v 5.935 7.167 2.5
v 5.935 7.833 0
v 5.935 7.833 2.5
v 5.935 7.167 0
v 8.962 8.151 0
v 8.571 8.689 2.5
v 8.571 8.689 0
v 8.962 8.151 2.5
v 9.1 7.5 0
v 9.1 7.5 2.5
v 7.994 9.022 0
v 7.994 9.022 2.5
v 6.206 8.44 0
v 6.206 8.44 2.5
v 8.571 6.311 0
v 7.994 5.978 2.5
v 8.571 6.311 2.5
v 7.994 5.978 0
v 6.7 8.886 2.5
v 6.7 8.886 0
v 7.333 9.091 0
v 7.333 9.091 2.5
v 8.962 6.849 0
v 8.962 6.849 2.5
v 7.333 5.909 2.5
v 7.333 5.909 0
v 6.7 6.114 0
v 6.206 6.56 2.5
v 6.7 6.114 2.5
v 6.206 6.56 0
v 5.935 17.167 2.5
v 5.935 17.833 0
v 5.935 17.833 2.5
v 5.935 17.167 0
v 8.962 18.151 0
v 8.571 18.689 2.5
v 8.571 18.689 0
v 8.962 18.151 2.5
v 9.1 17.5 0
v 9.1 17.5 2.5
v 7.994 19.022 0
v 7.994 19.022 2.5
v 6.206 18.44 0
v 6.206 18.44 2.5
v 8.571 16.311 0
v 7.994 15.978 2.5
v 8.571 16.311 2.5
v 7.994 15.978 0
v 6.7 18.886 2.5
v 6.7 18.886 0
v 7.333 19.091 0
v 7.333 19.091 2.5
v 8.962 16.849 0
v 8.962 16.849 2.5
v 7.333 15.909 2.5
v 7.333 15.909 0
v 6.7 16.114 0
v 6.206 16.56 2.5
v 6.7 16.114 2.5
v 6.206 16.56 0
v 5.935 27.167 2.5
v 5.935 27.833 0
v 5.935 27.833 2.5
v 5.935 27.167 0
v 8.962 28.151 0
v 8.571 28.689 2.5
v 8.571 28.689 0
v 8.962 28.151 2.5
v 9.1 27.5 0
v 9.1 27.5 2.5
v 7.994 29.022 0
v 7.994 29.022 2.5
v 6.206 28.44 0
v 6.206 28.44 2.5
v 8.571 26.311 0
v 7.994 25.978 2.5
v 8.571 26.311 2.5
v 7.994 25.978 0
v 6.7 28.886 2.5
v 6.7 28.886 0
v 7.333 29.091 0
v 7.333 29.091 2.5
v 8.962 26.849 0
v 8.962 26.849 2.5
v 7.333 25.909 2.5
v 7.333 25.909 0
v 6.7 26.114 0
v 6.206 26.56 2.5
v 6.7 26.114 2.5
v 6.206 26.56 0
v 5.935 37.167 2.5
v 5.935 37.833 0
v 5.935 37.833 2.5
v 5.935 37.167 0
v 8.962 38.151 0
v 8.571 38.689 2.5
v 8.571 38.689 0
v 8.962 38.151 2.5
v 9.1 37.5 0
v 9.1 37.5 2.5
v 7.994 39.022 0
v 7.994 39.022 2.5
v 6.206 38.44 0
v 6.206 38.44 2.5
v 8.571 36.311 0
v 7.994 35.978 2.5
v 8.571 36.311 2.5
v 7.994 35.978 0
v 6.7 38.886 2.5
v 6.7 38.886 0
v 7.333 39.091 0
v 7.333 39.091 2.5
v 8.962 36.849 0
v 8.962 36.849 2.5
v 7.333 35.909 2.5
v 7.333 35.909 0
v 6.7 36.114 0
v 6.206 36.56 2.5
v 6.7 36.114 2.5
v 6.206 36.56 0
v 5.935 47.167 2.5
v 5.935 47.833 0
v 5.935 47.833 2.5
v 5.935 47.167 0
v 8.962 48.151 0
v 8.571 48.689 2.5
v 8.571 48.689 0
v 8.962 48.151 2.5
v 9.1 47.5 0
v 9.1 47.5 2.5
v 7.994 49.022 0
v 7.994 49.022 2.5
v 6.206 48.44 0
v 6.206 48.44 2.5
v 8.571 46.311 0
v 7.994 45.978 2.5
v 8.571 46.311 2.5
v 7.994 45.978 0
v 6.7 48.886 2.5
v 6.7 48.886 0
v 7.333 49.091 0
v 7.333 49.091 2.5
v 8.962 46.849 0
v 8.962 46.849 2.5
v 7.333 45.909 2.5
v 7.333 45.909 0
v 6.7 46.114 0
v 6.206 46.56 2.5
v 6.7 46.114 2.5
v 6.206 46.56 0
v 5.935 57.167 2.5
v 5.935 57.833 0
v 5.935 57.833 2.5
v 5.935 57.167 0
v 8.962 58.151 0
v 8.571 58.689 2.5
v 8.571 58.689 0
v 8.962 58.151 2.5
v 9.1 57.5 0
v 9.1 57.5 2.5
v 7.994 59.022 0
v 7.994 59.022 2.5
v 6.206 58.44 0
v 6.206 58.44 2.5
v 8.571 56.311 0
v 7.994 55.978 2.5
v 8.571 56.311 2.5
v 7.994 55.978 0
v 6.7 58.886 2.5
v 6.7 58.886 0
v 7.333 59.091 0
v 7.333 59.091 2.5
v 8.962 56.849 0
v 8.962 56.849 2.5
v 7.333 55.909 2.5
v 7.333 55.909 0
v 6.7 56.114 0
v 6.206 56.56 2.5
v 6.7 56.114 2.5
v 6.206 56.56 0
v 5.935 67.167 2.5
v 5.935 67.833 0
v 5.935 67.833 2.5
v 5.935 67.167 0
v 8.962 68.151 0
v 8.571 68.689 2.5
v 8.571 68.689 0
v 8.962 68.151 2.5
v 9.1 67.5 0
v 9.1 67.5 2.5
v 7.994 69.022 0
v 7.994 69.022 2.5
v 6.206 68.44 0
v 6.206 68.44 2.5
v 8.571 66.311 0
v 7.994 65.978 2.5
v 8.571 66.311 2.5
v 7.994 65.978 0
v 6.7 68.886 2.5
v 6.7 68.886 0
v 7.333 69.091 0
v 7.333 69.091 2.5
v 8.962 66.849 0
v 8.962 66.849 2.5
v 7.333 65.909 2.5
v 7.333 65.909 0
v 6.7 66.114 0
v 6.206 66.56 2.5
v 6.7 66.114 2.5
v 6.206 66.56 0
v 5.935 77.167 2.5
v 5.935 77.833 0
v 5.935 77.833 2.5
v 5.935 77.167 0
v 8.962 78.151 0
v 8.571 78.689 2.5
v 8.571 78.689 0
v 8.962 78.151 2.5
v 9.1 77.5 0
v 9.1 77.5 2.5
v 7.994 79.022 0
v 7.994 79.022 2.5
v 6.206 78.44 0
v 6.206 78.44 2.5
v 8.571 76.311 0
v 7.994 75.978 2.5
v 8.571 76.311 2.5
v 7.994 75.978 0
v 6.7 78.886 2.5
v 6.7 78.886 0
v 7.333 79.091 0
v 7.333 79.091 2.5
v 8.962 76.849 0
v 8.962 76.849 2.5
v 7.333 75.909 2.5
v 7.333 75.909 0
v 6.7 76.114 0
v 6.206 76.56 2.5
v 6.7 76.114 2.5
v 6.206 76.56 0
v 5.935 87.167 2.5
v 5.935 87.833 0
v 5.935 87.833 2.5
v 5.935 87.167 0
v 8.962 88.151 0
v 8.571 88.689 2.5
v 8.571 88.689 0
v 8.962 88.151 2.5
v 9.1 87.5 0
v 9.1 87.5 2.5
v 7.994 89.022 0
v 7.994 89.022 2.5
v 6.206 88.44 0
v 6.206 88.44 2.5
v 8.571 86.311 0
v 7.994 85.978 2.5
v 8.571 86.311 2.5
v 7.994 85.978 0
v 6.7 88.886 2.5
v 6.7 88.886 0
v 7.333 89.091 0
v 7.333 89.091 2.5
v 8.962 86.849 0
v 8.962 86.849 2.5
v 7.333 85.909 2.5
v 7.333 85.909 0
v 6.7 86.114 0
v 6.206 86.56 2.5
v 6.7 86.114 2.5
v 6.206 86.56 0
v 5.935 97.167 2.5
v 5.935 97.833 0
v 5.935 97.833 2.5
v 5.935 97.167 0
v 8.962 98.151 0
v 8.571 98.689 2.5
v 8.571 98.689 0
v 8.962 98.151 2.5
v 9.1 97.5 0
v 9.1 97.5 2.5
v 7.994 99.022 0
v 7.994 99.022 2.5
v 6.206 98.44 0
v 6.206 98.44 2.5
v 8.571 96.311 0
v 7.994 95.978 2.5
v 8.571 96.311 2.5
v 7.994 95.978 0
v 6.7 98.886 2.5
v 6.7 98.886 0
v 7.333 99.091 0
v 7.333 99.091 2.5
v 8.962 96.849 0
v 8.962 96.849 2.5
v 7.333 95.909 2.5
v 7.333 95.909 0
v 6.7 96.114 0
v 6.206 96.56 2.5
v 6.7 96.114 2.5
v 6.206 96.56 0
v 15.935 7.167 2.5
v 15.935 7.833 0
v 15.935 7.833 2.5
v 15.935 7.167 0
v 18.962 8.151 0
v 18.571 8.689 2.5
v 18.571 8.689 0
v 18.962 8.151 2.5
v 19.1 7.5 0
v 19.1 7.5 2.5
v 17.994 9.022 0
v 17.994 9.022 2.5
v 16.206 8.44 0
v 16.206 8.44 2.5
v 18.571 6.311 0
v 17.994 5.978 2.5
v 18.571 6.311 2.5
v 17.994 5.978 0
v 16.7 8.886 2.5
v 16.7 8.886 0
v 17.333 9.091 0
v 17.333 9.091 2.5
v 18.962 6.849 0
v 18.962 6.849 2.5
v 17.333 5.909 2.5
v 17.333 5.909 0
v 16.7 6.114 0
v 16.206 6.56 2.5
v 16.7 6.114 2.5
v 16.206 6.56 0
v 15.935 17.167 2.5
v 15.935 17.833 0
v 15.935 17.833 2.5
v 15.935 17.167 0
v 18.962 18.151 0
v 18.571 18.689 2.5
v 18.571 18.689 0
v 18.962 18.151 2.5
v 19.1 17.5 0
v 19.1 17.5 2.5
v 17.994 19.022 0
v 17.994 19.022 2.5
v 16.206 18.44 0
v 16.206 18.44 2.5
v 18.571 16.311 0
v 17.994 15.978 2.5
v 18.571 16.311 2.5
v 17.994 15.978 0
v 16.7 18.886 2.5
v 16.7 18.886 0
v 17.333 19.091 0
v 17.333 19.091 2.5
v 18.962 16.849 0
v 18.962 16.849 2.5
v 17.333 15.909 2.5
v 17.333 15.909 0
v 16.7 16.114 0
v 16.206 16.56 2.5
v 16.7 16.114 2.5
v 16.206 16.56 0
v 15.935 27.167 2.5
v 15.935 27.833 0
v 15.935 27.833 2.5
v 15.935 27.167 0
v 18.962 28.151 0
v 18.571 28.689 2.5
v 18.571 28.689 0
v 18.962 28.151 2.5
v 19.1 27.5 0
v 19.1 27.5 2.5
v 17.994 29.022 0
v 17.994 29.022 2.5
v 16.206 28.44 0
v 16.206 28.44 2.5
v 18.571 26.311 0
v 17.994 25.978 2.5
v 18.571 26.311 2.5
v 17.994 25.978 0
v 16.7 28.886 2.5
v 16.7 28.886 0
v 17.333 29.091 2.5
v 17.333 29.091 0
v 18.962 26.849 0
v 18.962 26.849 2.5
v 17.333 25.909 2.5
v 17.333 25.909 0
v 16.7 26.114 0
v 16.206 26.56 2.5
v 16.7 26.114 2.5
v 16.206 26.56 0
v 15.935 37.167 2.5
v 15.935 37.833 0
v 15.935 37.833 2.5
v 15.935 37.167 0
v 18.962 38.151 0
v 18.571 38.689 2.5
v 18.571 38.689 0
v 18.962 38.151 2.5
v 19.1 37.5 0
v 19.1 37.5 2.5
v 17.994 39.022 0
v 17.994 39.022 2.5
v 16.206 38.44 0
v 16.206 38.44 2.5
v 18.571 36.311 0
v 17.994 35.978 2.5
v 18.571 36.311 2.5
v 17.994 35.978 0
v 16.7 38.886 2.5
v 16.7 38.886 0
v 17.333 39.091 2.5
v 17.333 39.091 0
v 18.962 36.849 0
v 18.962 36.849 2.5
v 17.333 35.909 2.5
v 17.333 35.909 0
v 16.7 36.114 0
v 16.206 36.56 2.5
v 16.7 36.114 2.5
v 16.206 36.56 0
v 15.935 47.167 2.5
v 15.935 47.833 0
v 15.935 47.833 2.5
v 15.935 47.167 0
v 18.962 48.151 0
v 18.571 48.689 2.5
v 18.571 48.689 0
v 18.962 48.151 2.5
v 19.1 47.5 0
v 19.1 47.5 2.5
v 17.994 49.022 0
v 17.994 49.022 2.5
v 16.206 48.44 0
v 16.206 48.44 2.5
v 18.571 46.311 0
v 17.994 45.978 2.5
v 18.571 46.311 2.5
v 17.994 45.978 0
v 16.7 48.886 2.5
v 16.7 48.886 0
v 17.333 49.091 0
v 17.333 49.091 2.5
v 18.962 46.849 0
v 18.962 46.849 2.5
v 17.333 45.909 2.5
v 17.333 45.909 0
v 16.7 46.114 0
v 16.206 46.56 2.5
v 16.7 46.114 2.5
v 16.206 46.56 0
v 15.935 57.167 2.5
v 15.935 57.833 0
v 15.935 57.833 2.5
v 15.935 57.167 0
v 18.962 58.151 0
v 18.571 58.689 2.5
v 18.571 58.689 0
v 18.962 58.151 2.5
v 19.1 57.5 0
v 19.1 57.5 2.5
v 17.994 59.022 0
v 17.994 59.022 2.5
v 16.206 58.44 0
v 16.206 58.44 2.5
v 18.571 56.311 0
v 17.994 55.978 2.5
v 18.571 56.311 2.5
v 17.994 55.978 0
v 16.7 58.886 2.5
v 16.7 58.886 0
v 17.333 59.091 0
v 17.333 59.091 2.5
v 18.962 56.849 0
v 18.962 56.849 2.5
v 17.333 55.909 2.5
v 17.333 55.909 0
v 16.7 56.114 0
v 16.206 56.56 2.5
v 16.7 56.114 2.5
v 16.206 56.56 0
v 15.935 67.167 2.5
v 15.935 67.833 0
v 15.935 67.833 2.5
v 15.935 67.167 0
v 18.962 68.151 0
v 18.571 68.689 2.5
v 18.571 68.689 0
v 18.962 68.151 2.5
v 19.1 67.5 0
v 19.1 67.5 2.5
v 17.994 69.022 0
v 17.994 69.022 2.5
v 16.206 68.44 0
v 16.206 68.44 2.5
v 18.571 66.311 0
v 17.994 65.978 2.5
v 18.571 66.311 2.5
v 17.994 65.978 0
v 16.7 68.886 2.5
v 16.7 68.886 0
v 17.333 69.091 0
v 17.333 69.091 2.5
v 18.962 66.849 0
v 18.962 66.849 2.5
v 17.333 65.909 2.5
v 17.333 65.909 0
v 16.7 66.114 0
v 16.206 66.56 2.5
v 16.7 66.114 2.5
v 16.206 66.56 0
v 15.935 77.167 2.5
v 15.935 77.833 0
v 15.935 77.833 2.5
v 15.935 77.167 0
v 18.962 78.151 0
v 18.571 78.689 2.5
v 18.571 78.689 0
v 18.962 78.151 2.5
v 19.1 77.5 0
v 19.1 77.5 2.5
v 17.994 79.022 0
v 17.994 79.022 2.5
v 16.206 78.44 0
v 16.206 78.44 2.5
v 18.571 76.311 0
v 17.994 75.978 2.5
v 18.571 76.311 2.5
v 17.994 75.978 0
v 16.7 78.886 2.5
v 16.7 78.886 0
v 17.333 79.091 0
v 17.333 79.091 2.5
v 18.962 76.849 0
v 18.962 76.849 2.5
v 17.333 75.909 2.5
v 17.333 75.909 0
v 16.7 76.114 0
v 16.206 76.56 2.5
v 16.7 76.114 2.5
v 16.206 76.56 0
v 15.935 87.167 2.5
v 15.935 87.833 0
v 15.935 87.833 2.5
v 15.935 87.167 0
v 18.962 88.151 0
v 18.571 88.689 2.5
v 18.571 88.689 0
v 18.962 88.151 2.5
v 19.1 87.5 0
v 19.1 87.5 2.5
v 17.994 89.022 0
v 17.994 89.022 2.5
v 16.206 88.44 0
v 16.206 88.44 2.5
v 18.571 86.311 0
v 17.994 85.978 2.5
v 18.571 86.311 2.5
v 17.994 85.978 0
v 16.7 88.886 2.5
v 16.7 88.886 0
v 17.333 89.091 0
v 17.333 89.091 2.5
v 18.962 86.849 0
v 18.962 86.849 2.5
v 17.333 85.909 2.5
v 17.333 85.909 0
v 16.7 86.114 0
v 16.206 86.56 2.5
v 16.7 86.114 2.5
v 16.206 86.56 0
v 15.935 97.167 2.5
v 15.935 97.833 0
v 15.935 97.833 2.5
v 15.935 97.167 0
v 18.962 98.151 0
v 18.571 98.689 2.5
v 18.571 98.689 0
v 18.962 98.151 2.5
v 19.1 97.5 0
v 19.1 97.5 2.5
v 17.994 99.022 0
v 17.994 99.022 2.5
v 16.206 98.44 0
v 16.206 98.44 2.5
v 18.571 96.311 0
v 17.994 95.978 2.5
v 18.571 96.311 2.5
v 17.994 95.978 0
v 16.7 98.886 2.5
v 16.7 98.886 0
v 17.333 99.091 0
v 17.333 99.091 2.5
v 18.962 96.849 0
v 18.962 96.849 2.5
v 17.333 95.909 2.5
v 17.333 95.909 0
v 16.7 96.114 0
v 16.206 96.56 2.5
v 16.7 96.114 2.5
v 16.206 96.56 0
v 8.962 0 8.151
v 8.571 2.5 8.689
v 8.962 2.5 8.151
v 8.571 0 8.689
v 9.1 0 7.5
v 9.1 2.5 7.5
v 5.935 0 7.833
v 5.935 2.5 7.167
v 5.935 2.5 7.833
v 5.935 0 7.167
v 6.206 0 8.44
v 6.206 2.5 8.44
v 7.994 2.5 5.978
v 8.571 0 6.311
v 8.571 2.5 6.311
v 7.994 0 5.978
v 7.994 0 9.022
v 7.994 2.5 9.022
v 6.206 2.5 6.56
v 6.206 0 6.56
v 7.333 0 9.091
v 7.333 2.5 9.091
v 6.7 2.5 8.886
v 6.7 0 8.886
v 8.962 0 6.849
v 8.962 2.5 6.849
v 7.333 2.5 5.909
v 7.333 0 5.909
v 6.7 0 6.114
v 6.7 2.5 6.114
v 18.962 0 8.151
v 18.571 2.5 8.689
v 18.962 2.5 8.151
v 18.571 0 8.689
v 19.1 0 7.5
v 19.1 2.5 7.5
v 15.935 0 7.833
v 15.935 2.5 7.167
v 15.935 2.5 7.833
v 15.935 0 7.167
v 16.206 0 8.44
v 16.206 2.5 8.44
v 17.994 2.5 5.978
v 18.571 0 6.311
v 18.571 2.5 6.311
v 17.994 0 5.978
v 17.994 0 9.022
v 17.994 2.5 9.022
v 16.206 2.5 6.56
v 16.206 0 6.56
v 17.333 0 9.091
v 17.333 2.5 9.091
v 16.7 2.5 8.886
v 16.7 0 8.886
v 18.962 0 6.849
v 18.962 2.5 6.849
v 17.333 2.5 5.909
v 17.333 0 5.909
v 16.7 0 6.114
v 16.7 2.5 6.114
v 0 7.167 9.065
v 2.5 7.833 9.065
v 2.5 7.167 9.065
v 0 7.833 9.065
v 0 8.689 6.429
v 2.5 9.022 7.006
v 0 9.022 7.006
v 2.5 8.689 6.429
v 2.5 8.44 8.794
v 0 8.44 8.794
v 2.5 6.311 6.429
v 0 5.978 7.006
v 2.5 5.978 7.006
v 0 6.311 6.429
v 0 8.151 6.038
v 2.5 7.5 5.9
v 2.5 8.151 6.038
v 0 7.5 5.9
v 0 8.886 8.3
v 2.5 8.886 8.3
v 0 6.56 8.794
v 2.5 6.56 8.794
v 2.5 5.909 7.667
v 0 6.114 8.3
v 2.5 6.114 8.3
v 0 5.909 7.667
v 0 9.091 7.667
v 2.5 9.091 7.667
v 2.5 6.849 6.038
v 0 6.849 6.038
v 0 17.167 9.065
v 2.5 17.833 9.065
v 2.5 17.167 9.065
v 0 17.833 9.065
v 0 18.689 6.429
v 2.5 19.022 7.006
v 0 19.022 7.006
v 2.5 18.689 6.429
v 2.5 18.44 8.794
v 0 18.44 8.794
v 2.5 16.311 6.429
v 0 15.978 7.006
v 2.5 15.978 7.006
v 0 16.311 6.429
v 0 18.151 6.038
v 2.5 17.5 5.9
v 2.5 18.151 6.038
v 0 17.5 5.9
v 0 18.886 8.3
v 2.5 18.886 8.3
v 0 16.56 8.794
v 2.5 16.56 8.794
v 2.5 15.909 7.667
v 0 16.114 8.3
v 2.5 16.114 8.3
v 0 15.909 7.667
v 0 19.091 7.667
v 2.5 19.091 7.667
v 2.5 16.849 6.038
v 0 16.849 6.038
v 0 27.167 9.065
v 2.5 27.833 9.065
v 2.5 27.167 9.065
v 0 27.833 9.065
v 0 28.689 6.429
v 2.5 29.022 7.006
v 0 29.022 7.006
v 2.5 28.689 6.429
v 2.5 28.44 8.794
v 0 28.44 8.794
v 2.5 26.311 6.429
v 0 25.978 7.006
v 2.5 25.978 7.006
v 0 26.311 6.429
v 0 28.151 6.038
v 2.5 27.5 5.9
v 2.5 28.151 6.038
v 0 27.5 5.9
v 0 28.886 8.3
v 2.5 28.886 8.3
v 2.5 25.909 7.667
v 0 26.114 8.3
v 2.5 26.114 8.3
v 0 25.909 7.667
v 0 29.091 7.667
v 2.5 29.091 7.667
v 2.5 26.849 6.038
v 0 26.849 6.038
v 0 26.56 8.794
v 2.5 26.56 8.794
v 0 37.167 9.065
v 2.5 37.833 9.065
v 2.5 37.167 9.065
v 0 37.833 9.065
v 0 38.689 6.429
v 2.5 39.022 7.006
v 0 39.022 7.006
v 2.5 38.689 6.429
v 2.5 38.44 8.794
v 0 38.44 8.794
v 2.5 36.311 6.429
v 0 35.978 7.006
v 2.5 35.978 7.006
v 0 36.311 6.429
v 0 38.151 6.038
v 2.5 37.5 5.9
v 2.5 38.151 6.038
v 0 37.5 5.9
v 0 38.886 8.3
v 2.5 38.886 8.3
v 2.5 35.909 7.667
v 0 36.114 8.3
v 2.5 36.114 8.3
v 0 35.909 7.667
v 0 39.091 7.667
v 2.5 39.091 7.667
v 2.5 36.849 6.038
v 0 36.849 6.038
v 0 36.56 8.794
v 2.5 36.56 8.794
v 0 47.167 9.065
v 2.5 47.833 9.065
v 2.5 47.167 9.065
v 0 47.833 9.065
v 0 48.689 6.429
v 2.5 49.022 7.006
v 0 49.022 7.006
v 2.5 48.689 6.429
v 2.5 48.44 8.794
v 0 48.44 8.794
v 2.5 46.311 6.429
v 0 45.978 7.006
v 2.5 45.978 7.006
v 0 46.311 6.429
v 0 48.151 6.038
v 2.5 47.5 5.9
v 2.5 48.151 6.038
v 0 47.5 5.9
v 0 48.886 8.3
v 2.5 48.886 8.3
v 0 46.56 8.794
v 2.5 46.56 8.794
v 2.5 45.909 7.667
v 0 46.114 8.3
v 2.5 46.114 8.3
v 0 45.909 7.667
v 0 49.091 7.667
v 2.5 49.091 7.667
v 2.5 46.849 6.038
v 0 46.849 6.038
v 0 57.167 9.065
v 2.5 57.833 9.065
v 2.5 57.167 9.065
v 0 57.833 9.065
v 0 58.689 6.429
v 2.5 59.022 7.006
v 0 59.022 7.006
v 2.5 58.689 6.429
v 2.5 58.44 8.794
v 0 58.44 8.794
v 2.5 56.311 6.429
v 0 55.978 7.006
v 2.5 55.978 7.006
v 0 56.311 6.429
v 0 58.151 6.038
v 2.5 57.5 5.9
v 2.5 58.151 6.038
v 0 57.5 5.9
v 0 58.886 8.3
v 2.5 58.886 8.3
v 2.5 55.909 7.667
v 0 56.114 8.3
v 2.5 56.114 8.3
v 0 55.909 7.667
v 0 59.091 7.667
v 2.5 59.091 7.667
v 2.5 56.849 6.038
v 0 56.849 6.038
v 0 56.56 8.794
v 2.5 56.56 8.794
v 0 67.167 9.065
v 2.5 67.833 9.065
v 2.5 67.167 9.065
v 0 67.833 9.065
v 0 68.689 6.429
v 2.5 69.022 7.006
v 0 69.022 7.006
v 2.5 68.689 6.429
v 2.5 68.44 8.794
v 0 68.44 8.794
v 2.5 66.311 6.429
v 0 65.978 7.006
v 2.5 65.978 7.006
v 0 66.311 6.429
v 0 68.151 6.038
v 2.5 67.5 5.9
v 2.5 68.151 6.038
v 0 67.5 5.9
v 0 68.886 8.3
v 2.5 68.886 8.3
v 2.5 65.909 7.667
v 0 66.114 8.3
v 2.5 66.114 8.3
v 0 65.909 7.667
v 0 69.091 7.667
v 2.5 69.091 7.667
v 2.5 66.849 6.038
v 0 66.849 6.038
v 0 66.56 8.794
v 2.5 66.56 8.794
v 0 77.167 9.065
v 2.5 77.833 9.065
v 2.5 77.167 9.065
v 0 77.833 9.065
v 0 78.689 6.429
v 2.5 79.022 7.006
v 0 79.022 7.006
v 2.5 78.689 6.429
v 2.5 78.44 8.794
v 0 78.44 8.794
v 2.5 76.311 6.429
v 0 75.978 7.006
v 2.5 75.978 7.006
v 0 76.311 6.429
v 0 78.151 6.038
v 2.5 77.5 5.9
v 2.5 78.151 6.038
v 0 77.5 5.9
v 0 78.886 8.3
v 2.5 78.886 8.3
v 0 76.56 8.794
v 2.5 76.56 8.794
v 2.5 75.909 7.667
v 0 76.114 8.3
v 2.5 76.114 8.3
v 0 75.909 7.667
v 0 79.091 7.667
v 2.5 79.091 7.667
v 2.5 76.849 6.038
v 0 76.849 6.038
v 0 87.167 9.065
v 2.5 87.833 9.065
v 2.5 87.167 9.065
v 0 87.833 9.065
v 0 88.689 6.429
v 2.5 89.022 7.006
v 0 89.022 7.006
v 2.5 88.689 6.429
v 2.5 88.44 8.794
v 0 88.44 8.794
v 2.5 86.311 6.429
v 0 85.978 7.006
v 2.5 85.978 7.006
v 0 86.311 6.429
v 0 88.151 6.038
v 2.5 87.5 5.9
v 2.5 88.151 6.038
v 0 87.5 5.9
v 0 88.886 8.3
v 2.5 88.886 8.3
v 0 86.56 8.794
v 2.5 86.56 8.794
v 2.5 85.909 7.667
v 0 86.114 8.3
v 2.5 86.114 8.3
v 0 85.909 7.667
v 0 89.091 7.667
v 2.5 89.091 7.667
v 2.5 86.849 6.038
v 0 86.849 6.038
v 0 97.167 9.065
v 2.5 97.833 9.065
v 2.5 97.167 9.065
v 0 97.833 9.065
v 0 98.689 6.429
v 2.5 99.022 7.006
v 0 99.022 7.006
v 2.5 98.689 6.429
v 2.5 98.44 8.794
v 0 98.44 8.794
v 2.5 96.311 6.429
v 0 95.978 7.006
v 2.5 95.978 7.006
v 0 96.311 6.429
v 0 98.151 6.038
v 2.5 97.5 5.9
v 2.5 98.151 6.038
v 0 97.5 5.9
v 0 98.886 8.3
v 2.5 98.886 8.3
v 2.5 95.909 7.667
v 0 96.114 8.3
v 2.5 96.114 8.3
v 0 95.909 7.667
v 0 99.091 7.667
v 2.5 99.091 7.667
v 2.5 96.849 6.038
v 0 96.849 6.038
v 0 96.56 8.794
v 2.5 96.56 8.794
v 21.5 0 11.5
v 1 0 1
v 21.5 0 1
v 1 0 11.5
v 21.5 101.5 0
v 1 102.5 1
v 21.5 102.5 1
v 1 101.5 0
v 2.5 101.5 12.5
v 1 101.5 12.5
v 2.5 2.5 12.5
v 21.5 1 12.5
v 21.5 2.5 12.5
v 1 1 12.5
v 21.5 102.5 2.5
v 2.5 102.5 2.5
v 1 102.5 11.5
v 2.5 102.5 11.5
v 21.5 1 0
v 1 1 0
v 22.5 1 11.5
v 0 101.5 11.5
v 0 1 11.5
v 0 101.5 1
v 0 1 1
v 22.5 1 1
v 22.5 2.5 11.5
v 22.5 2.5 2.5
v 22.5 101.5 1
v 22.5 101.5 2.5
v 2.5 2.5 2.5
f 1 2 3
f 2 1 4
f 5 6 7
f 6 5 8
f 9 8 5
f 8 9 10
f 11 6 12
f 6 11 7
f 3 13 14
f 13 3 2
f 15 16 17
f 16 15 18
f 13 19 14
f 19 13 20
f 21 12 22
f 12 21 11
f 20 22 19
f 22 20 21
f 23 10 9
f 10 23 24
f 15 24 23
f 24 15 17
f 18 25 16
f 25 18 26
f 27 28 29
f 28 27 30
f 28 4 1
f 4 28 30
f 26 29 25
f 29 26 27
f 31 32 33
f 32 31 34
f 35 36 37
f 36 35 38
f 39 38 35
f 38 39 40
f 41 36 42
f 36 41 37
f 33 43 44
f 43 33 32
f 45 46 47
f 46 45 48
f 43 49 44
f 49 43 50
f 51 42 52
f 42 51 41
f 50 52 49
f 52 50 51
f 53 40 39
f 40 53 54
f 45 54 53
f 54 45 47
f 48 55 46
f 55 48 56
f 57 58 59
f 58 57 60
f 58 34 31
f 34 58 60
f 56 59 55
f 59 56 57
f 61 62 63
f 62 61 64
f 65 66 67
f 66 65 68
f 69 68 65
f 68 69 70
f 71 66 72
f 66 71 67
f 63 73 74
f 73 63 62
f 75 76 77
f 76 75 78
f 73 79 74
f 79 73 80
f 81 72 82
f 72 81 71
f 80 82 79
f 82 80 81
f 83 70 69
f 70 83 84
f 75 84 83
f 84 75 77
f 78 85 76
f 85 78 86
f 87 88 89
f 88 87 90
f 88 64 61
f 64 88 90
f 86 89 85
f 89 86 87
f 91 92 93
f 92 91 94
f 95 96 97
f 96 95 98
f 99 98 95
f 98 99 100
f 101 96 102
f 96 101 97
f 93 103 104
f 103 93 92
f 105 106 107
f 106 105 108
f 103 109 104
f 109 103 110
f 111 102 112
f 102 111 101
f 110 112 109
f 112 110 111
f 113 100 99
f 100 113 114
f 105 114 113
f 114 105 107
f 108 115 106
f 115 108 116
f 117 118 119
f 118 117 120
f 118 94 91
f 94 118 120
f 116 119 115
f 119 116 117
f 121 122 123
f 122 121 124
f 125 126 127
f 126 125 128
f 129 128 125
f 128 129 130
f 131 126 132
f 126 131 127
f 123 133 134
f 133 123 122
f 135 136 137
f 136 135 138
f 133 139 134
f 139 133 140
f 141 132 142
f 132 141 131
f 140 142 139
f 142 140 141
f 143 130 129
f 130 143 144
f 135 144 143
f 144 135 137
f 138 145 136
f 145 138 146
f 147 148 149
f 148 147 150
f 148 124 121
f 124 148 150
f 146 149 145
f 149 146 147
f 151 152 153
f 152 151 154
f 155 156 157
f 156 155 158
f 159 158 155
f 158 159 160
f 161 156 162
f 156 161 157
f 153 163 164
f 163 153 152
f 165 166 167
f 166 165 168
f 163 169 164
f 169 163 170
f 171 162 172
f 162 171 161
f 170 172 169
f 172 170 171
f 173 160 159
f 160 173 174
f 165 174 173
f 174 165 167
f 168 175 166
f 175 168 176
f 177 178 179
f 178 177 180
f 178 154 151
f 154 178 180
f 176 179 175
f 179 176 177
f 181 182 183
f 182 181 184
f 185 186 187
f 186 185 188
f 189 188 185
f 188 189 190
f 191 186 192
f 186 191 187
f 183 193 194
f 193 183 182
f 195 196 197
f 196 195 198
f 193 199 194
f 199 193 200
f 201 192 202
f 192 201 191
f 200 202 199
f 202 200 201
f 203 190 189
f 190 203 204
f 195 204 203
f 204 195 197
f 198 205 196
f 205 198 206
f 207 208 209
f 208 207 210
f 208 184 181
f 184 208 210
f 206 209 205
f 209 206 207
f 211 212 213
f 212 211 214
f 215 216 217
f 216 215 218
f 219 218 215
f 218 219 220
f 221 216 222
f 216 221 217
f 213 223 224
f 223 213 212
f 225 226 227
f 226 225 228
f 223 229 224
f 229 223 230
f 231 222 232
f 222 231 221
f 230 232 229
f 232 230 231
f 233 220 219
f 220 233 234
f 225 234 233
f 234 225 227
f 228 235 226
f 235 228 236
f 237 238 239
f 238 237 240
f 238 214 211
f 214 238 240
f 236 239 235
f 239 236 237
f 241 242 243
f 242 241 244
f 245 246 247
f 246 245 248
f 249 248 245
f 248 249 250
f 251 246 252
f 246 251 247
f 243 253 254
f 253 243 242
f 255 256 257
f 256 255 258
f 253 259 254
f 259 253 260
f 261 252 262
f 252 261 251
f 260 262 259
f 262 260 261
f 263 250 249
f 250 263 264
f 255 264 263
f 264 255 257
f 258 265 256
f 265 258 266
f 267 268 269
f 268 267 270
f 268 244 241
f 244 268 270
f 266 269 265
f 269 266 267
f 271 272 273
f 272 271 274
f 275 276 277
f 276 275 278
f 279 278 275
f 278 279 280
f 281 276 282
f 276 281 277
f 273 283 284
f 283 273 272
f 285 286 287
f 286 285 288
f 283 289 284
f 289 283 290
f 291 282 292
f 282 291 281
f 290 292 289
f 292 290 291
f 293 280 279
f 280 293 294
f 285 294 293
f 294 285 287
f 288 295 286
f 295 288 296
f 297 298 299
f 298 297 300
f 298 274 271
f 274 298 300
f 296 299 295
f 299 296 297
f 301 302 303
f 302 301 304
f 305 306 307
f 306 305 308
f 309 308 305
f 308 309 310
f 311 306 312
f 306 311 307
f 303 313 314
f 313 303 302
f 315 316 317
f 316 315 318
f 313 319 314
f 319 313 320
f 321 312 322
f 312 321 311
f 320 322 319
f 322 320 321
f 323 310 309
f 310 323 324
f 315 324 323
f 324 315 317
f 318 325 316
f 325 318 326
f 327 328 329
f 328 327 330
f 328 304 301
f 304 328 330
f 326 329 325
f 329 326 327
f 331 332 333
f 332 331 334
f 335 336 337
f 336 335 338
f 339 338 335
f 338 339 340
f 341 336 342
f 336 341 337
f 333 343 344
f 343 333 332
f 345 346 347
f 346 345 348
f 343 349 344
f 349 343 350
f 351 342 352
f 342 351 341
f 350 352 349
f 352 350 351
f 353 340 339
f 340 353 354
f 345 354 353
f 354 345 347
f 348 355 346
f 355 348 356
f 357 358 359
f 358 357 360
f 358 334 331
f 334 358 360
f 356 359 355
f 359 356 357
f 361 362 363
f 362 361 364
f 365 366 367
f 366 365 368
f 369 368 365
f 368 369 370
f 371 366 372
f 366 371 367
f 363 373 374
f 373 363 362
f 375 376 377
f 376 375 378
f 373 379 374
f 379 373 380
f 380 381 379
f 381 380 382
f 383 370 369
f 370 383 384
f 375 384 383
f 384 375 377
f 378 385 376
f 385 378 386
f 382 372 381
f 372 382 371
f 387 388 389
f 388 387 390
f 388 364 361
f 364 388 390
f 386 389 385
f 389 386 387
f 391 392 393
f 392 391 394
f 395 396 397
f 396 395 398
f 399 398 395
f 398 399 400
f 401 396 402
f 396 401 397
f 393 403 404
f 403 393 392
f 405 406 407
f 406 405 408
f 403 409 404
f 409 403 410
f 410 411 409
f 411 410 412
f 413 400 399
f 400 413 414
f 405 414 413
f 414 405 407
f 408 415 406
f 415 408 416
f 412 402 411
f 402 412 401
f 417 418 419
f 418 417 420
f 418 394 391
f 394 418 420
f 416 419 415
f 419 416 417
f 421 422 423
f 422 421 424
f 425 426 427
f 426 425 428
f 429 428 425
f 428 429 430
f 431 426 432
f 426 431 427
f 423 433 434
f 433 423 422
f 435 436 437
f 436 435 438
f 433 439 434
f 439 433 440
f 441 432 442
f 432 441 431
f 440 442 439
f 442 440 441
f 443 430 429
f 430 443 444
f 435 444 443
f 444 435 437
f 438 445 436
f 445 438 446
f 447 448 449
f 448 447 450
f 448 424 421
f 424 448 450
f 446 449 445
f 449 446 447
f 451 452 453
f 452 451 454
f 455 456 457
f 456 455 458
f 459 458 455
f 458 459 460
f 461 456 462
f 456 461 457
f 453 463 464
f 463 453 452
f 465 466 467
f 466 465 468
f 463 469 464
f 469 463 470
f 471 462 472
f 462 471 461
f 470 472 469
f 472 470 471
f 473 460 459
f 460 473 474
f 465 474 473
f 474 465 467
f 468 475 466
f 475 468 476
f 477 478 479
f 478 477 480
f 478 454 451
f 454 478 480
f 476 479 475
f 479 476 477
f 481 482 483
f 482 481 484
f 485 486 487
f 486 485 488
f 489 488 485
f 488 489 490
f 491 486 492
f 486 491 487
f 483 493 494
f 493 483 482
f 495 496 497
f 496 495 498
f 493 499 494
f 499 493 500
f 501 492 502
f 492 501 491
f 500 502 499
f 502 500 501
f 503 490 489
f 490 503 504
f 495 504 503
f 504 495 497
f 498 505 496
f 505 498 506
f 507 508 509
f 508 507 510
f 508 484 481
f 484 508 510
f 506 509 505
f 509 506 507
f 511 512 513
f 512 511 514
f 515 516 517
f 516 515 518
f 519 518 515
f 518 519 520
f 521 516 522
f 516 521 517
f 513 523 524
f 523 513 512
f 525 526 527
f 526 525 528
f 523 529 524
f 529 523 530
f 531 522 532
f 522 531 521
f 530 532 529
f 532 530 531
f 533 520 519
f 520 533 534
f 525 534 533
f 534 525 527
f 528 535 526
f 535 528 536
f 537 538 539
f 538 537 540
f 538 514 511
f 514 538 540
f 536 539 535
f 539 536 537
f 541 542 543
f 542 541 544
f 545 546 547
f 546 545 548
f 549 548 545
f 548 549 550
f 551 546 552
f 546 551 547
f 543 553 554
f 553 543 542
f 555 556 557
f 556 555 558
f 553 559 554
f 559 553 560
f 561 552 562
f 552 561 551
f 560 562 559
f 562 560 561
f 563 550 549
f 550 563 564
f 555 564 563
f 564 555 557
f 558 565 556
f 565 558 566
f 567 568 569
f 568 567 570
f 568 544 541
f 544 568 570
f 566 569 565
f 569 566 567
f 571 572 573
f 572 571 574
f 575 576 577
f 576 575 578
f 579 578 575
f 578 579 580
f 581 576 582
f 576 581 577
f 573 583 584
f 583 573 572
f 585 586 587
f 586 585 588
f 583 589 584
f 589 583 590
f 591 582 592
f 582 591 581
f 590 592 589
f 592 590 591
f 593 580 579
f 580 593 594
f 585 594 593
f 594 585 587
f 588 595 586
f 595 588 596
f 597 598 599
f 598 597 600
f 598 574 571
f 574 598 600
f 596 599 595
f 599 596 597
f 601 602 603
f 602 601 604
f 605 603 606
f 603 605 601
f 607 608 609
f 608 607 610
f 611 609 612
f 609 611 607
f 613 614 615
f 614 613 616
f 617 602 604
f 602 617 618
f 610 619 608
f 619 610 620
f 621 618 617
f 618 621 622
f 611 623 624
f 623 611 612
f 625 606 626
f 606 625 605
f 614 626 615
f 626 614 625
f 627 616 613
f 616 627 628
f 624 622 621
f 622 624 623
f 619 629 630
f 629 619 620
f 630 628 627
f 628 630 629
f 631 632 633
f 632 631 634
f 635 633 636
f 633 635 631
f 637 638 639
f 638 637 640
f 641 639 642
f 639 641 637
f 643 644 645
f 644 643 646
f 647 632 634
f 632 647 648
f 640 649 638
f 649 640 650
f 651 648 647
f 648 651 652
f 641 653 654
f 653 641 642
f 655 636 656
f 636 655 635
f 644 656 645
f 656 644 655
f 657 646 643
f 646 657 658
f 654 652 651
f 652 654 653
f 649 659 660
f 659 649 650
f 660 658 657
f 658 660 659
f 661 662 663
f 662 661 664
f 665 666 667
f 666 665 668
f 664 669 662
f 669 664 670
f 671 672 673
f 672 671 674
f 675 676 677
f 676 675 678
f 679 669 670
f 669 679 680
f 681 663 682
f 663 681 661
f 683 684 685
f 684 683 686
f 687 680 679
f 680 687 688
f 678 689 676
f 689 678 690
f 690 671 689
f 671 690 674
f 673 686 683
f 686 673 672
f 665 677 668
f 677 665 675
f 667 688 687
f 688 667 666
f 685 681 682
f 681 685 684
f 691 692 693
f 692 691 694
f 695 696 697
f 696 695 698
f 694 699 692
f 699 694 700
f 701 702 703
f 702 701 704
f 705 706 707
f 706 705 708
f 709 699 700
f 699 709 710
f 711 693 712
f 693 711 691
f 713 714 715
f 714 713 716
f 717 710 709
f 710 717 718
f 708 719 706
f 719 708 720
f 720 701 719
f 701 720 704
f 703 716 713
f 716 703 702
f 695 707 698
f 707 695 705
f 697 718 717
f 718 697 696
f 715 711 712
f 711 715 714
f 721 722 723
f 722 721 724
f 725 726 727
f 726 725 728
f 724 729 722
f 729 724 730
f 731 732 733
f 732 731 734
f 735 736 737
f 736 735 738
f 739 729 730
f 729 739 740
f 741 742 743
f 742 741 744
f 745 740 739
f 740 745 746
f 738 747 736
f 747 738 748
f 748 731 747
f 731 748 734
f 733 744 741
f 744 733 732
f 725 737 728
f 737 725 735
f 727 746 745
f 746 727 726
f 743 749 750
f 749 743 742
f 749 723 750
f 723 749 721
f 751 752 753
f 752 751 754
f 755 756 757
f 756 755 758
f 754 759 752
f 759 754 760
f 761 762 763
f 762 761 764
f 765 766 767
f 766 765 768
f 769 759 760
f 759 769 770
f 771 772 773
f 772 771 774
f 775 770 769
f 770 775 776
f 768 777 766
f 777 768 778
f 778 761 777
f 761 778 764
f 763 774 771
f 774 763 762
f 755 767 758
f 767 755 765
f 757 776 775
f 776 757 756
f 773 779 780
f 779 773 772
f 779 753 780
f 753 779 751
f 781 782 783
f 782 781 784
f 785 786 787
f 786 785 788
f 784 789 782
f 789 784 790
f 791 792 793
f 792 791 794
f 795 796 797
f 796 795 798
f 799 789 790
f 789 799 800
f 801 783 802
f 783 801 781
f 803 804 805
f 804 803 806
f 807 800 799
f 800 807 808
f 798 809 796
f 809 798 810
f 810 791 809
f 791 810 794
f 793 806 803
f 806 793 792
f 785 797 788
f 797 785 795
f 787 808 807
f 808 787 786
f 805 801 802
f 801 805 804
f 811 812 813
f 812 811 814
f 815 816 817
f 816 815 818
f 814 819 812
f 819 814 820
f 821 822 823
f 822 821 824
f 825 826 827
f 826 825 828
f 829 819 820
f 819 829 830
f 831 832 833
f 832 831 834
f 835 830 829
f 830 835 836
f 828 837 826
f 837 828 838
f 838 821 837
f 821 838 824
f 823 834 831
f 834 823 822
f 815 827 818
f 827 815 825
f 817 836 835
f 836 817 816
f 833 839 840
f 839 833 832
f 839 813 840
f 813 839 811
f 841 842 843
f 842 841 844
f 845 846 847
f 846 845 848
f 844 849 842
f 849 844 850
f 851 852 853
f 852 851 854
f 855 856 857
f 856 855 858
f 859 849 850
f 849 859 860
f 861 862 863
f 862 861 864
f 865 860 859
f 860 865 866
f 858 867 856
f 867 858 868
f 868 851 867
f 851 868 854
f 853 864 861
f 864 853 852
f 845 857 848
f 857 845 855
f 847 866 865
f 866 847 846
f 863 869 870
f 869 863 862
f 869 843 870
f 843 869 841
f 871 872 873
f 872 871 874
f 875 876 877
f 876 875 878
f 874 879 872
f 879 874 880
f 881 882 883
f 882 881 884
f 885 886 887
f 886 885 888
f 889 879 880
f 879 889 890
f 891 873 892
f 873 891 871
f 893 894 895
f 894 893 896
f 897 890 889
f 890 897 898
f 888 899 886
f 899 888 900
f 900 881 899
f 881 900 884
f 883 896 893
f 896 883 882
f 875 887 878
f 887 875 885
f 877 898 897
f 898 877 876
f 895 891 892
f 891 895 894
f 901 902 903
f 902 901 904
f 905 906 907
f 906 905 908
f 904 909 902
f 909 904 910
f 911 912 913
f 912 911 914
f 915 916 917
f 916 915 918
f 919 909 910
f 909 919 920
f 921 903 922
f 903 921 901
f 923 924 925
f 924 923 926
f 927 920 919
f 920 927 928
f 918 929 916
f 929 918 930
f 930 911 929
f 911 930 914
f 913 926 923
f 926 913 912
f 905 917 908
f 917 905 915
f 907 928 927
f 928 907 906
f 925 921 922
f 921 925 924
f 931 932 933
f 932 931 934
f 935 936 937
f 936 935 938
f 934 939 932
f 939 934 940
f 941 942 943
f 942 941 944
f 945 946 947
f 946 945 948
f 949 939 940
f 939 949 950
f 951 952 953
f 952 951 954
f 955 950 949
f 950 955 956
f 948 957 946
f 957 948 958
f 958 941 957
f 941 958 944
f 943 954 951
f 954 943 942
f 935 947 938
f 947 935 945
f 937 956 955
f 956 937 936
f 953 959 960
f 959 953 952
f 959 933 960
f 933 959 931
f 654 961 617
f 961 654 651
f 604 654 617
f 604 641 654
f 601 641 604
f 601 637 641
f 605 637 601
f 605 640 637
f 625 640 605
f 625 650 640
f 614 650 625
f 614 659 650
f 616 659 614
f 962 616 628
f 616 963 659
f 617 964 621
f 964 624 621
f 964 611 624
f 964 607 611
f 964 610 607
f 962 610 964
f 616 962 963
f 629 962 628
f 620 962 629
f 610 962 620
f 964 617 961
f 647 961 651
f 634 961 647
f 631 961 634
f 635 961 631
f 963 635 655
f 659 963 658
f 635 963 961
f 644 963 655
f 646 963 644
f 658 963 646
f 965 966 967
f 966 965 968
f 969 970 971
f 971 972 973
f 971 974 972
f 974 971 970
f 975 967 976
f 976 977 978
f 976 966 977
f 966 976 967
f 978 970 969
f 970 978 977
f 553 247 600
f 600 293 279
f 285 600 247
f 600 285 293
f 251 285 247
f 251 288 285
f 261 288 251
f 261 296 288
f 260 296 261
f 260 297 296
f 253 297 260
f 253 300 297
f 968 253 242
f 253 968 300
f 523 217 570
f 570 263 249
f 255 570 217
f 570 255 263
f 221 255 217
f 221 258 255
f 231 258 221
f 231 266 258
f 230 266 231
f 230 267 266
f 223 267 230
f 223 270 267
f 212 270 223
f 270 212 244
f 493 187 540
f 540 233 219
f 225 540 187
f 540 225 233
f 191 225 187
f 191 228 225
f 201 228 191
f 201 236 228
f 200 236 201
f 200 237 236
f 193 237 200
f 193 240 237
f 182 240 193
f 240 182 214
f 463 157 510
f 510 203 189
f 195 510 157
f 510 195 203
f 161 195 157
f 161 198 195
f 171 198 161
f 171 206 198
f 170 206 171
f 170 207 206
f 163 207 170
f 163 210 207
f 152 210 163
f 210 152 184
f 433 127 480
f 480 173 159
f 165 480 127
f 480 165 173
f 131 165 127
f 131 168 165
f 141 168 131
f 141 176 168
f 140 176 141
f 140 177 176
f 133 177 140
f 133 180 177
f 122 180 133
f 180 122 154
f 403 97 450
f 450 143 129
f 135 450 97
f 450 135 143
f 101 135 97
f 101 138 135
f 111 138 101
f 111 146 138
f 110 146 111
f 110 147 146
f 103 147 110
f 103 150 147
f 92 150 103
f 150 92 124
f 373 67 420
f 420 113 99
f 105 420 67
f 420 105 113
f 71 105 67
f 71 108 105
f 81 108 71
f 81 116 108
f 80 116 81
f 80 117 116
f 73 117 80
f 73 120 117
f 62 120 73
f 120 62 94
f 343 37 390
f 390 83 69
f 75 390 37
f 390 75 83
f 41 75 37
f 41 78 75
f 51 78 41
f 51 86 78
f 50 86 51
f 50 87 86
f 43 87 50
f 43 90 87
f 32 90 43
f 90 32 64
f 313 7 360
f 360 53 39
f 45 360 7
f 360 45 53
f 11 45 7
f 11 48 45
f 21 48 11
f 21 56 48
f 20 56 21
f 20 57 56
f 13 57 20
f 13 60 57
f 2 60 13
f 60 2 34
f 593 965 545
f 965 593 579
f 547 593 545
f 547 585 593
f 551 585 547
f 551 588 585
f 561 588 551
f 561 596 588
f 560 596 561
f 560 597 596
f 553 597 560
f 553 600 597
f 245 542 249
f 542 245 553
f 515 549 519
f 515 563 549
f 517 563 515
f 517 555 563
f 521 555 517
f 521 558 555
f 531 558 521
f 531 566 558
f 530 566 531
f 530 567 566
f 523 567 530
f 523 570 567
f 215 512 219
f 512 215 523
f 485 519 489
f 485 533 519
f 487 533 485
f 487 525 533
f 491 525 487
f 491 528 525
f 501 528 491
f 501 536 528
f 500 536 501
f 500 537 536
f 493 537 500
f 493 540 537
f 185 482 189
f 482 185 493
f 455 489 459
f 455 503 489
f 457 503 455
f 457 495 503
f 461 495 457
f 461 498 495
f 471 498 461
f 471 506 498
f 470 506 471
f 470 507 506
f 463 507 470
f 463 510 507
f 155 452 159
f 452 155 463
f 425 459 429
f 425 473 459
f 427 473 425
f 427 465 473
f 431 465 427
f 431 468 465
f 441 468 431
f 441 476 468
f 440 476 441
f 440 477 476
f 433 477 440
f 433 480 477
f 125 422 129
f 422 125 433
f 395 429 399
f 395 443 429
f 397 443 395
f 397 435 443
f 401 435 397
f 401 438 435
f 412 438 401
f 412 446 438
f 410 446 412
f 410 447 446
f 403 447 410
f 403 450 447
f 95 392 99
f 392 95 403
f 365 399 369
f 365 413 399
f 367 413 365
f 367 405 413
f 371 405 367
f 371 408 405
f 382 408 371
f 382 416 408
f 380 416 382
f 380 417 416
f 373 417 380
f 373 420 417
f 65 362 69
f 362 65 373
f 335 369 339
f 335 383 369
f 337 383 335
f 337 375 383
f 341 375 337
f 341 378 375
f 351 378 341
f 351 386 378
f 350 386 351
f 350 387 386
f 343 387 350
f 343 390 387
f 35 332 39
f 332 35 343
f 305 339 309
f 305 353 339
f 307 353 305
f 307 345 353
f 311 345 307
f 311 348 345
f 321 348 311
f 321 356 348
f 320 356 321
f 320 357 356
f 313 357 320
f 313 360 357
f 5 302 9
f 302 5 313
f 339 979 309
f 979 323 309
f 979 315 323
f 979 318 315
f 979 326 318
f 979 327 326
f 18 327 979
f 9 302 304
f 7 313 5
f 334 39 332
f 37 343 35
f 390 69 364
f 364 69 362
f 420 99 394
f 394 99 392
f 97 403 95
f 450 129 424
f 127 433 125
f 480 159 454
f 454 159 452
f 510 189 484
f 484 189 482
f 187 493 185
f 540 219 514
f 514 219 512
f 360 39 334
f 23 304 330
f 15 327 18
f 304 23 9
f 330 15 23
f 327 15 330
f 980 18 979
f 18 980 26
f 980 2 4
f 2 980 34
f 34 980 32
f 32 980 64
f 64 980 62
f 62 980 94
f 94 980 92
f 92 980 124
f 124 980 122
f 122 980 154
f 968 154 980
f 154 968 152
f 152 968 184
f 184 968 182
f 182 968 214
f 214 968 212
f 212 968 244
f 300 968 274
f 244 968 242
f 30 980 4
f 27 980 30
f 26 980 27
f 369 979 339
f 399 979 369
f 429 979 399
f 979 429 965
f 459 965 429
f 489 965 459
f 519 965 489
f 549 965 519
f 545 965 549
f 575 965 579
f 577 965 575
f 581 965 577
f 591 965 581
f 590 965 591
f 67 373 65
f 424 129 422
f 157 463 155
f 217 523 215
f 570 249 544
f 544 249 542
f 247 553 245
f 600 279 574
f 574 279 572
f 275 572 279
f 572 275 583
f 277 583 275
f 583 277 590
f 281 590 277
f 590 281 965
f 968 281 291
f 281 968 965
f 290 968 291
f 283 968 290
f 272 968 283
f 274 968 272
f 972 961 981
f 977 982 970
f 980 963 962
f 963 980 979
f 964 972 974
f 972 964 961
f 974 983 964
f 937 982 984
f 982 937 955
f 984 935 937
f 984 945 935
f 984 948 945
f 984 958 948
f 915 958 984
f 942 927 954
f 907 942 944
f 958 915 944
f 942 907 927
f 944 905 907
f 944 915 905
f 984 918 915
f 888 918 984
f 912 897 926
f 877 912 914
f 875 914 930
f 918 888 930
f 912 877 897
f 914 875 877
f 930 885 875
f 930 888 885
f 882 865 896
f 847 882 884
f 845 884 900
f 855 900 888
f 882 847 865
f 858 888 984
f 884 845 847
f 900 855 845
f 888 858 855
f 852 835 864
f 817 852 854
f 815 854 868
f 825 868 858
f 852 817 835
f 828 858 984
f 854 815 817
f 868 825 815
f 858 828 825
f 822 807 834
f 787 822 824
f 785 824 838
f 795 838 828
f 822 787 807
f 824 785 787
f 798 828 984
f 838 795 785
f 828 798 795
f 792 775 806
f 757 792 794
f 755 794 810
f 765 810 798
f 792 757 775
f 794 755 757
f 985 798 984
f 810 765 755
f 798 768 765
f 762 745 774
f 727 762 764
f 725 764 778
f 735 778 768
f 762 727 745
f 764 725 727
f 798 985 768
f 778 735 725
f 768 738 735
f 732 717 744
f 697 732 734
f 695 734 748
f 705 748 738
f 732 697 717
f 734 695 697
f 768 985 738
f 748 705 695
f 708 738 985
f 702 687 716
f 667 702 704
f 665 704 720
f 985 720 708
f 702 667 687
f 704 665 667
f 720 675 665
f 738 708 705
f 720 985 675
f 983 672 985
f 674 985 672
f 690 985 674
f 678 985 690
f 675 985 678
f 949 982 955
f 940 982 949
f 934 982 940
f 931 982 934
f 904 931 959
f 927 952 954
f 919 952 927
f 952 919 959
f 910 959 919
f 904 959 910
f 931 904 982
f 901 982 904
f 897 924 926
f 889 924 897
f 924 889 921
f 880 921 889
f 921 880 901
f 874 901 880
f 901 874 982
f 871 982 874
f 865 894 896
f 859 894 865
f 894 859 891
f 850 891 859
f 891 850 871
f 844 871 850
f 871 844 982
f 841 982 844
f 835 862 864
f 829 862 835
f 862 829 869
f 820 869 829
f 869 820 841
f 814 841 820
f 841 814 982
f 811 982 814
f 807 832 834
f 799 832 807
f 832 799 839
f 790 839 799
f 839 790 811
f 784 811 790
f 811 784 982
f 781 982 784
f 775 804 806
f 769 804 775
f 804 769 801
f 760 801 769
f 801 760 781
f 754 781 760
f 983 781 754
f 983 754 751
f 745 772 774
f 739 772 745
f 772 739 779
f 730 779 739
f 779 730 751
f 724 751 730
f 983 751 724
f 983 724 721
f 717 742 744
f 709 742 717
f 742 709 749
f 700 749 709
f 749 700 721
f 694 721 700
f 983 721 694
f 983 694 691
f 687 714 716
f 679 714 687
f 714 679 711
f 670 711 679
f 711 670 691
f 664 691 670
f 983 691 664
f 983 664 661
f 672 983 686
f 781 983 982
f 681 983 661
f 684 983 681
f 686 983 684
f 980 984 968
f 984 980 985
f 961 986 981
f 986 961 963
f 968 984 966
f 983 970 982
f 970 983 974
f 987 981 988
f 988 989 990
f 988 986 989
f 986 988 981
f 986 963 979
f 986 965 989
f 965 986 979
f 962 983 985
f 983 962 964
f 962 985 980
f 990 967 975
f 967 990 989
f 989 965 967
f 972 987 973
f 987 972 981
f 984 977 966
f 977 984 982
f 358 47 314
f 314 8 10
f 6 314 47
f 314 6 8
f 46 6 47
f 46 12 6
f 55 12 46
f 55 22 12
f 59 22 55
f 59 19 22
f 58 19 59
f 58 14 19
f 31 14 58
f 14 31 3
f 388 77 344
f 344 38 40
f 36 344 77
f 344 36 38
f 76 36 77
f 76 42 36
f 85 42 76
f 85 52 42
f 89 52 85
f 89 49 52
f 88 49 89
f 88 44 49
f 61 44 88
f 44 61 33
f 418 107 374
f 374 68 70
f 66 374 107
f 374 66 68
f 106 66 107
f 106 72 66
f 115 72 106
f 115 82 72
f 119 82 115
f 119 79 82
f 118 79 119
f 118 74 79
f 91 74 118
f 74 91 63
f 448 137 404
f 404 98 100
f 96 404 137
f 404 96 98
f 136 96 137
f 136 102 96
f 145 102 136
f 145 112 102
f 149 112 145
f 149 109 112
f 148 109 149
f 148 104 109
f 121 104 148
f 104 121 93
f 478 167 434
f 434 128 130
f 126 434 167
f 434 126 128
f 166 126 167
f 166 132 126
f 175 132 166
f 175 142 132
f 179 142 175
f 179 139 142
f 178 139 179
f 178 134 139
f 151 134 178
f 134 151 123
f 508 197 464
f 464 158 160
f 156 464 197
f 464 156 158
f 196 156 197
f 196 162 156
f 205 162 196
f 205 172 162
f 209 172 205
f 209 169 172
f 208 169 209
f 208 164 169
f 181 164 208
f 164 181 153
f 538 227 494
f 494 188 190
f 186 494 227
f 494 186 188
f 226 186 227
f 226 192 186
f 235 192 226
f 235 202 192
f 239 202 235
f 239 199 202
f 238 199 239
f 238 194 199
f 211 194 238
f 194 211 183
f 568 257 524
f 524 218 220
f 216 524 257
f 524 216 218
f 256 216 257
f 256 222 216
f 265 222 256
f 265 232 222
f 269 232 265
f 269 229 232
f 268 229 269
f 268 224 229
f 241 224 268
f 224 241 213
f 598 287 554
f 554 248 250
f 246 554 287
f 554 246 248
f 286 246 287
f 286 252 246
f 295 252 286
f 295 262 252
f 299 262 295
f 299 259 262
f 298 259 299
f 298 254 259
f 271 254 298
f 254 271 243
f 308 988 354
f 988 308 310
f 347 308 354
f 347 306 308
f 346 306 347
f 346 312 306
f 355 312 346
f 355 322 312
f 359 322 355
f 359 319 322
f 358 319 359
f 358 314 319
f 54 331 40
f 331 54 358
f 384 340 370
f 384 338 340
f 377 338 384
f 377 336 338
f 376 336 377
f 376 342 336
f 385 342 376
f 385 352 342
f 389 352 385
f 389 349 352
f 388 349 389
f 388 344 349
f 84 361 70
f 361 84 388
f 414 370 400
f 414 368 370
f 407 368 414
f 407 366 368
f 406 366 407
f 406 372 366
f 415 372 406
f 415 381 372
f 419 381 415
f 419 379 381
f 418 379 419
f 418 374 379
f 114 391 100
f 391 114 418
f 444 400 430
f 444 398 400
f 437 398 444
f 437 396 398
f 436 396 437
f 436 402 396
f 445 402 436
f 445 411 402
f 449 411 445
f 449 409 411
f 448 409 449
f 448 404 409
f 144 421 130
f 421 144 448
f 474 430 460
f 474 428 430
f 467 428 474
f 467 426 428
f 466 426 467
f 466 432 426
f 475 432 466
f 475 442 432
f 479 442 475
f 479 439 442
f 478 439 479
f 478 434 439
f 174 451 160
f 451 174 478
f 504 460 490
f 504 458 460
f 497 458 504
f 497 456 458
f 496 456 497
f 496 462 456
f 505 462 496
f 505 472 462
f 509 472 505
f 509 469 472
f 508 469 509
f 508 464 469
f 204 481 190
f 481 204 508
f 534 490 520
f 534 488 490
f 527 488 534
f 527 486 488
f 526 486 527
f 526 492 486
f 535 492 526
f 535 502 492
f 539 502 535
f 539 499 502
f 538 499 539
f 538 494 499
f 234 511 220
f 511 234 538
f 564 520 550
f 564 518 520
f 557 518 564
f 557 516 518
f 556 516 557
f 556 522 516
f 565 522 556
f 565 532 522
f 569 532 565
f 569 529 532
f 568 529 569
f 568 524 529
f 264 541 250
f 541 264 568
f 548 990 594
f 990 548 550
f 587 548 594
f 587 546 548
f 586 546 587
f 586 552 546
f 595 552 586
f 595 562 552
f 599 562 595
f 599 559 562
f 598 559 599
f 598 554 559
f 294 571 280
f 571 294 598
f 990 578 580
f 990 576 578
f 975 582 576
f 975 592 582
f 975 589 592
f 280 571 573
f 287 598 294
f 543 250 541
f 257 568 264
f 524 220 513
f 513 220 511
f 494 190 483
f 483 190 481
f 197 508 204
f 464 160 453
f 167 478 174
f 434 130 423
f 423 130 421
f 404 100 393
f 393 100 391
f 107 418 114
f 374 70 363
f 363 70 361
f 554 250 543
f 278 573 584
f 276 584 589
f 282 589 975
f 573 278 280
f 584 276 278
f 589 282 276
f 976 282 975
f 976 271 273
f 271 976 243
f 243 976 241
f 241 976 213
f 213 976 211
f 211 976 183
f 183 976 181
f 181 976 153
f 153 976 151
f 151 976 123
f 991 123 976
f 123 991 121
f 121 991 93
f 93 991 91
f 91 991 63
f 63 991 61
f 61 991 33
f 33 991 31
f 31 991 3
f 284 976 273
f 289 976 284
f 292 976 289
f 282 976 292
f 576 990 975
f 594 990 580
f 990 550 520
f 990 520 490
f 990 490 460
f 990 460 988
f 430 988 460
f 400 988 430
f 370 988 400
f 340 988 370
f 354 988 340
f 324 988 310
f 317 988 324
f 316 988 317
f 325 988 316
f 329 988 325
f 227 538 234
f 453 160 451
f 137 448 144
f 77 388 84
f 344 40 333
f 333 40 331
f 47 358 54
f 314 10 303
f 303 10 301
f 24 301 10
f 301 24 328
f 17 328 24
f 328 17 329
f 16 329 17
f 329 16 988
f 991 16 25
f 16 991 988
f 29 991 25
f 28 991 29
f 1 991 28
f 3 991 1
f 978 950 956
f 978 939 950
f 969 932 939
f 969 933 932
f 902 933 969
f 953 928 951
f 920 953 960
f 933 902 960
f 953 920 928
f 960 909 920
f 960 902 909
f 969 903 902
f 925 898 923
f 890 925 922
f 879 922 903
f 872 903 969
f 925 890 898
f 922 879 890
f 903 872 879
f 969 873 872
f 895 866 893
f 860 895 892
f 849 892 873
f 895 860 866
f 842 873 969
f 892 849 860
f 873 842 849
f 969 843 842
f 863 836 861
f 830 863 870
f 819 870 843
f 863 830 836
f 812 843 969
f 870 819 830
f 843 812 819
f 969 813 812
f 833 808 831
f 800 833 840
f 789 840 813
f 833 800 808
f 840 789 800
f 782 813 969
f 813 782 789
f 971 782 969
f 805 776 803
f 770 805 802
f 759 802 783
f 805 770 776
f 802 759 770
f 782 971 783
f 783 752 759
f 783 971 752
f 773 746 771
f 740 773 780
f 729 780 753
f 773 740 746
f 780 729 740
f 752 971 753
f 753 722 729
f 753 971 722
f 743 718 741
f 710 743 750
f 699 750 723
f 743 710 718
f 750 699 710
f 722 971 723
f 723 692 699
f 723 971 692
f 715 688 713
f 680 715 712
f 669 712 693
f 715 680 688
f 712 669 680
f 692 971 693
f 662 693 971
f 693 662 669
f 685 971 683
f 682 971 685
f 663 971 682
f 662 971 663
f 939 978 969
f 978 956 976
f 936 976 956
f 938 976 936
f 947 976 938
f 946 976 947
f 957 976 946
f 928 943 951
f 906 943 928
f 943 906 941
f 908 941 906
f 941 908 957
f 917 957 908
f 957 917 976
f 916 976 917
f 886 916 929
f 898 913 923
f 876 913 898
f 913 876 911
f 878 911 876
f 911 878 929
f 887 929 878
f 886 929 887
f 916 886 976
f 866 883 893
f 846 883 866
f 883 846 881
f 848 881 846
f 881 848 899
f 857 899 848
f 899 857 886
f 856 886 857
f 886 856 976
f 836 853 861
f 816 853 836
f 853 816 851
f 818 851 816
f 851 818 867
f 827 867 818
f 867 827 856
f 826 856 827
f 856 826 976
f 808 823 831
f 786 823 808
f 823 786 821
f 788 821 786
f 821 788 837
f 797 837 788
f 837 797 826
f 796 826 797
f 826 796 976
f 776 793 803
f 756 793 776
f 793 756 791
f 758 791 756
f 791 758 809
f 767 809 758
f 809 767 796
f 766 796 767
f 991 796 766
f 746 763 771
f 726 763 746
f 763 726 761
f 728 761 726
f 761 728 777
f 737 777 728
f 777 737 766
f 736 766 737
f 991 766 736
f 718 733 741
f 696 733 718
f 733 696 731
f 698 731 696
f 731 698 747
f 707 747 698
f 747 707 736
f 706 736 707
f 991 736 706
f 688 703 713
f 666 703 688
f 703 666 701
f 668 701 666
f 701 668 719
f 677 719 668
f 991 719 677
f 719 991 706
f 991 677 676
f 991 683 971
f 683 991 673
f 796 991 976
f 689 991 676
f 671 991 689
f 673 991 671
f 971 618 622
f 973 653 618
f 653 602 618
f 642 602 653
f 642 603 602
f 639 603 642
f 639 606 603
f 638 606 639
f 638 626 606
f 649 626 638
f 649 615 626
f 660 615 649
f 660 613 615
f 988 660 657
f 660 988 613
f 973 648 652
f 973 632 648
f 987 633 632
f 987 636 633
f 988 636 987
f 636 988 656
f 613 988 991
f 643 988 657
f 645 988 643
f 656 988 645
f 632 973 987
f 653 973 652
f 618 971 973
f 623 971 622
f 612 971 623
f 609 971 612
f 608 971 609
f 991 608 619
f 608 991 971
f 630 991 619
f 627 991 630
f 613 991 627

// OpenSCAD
/*  
        Corner.scad
        M3Z core library 1.0.0
*/

//BEGIN OPTIONS - edit these parameters to generate custom parts of this form.

N = 2; //whole number of 10mm units along the X axis
M = 10; //whole number of 10mm units along the Y axis
H = 1; //whole number of 10mm units along the Z axis.

THICKNESS = 2.5; //Nominal 2.5mm - thickness of the walls of the part

CHAMFER_DEPTH = 1.0; //Default 1.0mm

HOLE_DIAMETER = 3.2; //Nominal 3.0mm - common diameter of holes throughout

HOLE_FACES = 15; //Default 20 - higher number => slower render, smoother holes

//END OPTIONS - edit all else at your own risk

//Modules

module chamferCube(dimensions,depth){
    //where dimensions is a vector e.g. [10,20,30] and depth is the depth of the chamfer.
    
    f=2*depth;
    
    octaPoints = [ 
                    [1,0,0],
                    [0,1,0],
                    [-1,0,0],
                    [0,-1,0],
                    [0,0,1],
                    [0,0,-1]
                ];

    octaFaces = [   
                    [0,4,1],
                    [1,4,2],
                    [2,4,3],
                    [3,4,0],
                    [0,1,5],
                    [1,2,5],
                    [2,3,5],
                    [3,0,5] 
                ];
    translate([depth,depth,depth])
    minkowski(){
        cube([dimensions[0]-f,dimensions[1]-f,dimensions[2]-f]);
        polyhedron(octaPoints*depth, octaFaces);
    }
}

//variables (derived and not to be edited)

bodyWidth = N * 10 + THICKNESS;
bodyLength = M * 10 + THICKNESS;
bodyHeight = H * 10 + THICKNESS;
bodyDims = [bodyWidth,bodyLength,bodyHeight];

//Part Generating Code

difference(){
    chamferCube(bodyDims,1);
    translate([THICKNESS,THICKNESS,THICKNESS]){
        cube([N*15,M*15,H*15]);
    }
    
    for(i = [0:N-1]){
        for(j = [0:M-1]){
            translate([THICKNESS+5+10*i, THICKNESS+5+10*j,0]){
                cylinder(h= bodyHeight*3, d = HOLE_DIAMETER, center = true, $fn = HOLE_FACES);
            }
        }
    }
    for(i = [0:N-1]){
        for(k = [0:H-1]){
            translate([THICKNESS+5+10*i, 0, THICKNESS+5+10*k]){
                rotate(90,[1,0,0]){
                    cylinder(h=bodyLength*3, d=HOLE_DIAMETER, center = true, $fn = HOLE_FACES);
                }
            }
        }
    }
    for(j = [0:M-1]){
        for(k = [0:H-1]){
            translate([0,THICKNESS+5+10*j,THICKNESS+5+10*k]){
                rotate(90,[0,1,0]){
                    cylinder(h=bodyWidth*3, d=HOLE_DIAMETER, center = true, $fn = HOLE_FACES);
                }
            }
        }
    }
}
    
